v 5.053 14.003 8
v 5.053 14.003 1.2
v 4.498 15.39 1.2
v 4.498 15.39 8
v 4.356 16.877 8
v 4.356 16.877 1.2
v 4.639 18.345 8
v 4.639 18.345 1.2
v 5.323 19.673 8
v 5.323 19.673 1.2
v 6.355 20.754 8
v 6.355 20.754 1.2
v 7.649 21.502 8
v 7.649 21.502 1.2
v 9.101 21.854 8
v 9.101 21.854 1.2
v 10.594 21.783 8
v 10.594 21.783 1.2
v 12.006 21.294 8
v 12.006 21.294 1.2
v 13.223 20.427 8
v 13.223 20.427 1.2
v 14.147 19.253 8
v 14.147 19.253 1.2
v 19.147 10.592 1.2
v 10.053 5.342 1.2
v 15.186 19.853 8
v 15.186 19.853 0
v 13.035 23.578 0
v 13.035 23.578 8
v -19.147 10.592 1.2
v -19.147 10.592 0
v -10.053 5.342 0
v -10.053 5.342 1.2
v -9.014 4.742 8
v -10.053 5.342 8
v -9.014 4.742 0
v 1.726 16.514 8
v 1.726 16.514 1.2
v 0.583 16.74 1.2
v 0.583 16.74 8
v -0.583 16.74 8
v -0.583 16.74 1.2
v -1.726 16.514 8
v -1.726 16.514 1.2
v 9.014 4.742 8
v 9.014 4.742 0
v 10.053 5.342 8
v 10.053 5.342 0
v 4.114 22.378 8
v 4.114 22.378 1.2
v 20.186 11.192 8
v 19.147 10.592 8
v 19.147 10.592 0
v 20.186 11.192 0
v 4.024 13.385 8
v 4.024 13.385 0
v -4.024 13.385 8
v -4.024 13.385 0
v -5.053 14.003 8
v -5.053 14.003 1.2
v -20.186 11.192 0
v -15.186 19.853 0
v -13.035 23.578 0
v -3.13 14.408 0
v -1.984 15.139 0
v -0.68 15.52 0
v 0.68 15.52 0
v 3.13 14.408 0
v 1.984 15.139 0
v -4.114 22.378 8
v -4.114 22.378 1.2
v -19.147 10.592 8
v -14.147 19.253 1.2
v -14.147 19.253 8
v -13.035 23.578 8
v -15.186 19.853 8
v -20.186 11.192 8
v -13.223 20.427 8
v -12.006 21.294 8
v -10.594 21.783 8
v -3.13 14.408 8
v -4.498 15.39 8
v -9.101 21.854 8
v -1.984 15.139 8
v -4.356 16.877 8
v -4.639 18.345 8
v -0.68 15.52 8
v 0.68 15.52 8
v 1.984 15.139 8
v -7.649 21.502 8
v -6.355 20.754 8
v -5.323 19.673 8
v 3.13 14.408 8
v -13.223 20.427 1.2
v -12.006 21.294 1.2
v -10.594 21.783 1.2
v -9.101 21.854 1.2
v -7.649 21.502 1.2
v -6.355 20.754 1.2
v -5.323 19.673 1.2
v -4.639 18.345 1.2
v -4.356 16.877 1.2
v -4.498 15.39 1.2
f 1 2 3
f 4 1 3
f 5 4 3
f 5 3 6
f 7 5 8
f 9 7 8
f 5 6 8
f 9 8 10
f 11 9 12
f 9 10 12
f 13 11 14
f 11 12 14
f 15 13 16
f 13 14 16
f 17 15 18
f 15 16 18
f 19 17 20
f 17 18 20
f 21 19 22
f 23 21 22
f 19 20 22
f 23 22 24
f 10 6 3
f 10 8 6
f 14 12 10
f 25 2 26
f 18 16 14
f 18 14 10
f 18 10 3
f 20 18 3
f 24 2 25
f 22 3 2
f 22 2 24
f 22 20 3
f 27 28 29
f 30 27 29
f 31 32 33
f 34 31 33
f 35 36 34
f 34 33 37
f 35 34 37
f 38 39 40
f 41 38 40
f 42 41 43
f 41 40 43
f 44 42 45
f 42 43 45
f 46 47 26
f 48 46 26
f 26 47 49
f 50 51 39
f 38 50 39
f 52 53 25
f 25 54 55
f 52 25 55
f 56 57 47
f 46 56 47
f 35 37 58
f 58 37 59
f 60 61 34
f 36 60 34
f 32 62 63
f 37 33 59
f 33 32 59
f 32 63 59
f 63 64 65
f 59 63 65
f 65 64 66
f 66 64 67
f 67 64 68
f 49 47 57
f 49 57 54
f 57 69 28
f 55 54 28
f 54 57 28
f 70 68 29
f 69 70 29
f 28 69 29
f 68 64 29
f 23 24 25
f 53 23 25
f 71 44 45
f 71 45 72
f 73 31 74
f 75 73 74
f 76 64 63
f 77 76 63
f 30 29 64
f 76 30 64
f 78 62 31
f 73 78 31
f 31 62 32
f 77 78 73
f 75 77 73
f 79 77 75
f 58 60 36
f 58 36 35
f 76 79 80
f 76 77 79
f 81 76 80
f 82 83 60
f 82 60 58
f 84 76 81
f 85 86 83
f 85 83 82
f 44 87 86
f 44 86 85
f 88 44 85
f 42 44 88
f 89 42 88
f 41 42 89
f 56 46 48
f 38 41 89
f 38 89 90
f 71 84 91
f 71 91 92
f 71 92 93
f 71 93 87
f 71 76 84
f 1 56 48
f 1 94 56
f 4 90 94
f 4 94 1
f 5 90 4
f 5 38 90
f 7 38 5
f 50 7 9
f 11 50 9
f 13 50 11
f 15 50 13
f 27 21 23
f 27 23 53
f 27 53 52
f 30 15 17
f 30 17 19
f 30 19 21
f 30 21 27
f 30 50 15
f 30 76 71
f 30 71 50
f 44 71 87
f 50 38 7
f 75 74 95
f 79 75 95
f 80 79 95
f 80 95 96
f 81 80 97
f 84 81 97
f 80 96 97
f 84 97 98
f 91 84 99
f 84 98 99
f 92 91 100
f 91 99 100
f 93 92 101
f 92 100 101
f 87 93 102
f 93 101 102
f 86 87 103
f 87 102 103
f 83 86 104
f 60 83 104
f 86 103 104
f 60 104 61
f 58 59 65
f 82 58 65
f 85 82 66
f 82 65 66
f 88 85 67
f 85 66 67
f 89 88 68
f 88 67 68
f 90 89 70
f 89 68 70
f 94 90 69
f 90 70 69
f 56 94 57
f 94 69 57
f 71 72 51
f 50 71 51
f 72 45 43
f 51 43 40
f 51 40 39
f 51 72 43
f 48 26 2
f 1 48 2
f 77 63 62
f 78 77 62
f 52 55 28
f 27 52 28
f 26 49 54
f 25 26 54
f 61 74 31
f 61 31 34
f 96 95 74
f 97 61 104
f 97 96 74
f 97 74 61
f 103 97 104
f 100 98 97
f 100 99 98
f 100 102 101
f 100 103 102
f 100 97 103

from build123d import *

# Parameters (mm, degrees)
F1_DEPTH = 1.2
F3_DEPTH = 8
F5_DEPTH = 6.8


with BuildPart() as f1:
    # F0 (on Top) → F1 (new body)
    with BuildSketch(Plane.XY):
        with BuildLine():
            Line((-19.146633, 10.592434), (-10.053367, 5.342434))
            Line((-10.053367, 5.342434), (-5.053367, 14.002688))
            ThreePointArc((-5.053367, 14.002688), (0, 16.767957), (5.053367, 14.002688))
            Line((5.053367, 14.002688), (10.053367, 5.342434))
            Line((10.053367, 5.342434), (19.146633, 10.592434))
            Line((19.146633, 10.592434), (14.146633, 19.252688))
            Line((14.146633, 19.252688), (12.342414, 22.377688))
            Line((12.342414, 22.377688), (-12.342414, 22.377688))
            Line((-12.342414, 22.377688), (-14.146633, 19.252688))
            Line((-14.146633, 19.252688), (-19.146633, 10.592434))
        make_face()
    extrude(amount=F1_DEPTH)

    # F2 (on face) → F3 (join)
    with BuildSketch(Plane.XY):
        with BuildLine():
            Line((-5.053367, 14.002688), (-10.053367, 5.342434))
            Line((-10.053367, 5.342434), (-9.014136, 4.742434))
            Line((-9.014136, 4.742434), (-4.024356, 13.384986))
            ThreePointArc((-4.024356, 13.384986), (0, 15.568776), (4.024356, 13.384986))
            Line((4.024356, 13.384986), (9.014136, 4.742434))
            Line((9.014136, 4.742434), (10.053367, 5.342434))
            Line((10.053367, 5.342434), (5.053367, 14.002688))
            ThreePointArc((5.053367, 14.002688), (0, 16.767957), (-5.053367, 14.002688))
        make_face()
        Polygon((-19.146633, 10.592434), (-14.146633, 19.252688), (-12.342414, 22.377688), (12.342414, 22.377688), (14.146633, 19.252688), (19.146633, 10.592434), (20.185864, 11.192434), (15.185864, 19.852688), (13.035234, 23.577688), (-13.035234, 23.577688), (-15.185864, 19.852688), (-20.185864, 11.192434), align=None)
    extrude(amount=F3_DEPTH)

    # F4 (on face) → F5 (join, through all)
    with BuildSketch(Plane.XY.offset(1.2)):
        with BuildLine():
            Line((-4.113592, 22.377688), (-12.342414, 22.377688))
            Line((-12.342414, 22.377688), (-14.146633, 19.252688))
            ThreePointArc((-14.146633, 19.252688), (-6.975, 21.174321), (-5.053367, 14.002688))
            ThreePointArc((-5.053367, 14.002688), (-3.614694, 15.556901), (-1.725656, 16.514443))
            Line((-1.725656, 16.514443), (-4.113592, 22.377688))
        make_face()
        with BuildLine():
            ThreePointArc((1.725656, 16.514443), (3.614694, 15.556901), (5.053367, 14.002688))
            ThreePointArc((5.053367, 14.002688), (6.975, 21.174321), (14.146633, 19.252688))
            Line((14.146633, 19.252688), (12.342414, 22.377688))
            Line((12.342414, 22.377688), (4.113592, 22.377688))
            Line((4.113592, 22.377688), (1.725656, 16.514443))
        make_face()
    extrude(amount=F5_DEPTH)


solid = f1.part
